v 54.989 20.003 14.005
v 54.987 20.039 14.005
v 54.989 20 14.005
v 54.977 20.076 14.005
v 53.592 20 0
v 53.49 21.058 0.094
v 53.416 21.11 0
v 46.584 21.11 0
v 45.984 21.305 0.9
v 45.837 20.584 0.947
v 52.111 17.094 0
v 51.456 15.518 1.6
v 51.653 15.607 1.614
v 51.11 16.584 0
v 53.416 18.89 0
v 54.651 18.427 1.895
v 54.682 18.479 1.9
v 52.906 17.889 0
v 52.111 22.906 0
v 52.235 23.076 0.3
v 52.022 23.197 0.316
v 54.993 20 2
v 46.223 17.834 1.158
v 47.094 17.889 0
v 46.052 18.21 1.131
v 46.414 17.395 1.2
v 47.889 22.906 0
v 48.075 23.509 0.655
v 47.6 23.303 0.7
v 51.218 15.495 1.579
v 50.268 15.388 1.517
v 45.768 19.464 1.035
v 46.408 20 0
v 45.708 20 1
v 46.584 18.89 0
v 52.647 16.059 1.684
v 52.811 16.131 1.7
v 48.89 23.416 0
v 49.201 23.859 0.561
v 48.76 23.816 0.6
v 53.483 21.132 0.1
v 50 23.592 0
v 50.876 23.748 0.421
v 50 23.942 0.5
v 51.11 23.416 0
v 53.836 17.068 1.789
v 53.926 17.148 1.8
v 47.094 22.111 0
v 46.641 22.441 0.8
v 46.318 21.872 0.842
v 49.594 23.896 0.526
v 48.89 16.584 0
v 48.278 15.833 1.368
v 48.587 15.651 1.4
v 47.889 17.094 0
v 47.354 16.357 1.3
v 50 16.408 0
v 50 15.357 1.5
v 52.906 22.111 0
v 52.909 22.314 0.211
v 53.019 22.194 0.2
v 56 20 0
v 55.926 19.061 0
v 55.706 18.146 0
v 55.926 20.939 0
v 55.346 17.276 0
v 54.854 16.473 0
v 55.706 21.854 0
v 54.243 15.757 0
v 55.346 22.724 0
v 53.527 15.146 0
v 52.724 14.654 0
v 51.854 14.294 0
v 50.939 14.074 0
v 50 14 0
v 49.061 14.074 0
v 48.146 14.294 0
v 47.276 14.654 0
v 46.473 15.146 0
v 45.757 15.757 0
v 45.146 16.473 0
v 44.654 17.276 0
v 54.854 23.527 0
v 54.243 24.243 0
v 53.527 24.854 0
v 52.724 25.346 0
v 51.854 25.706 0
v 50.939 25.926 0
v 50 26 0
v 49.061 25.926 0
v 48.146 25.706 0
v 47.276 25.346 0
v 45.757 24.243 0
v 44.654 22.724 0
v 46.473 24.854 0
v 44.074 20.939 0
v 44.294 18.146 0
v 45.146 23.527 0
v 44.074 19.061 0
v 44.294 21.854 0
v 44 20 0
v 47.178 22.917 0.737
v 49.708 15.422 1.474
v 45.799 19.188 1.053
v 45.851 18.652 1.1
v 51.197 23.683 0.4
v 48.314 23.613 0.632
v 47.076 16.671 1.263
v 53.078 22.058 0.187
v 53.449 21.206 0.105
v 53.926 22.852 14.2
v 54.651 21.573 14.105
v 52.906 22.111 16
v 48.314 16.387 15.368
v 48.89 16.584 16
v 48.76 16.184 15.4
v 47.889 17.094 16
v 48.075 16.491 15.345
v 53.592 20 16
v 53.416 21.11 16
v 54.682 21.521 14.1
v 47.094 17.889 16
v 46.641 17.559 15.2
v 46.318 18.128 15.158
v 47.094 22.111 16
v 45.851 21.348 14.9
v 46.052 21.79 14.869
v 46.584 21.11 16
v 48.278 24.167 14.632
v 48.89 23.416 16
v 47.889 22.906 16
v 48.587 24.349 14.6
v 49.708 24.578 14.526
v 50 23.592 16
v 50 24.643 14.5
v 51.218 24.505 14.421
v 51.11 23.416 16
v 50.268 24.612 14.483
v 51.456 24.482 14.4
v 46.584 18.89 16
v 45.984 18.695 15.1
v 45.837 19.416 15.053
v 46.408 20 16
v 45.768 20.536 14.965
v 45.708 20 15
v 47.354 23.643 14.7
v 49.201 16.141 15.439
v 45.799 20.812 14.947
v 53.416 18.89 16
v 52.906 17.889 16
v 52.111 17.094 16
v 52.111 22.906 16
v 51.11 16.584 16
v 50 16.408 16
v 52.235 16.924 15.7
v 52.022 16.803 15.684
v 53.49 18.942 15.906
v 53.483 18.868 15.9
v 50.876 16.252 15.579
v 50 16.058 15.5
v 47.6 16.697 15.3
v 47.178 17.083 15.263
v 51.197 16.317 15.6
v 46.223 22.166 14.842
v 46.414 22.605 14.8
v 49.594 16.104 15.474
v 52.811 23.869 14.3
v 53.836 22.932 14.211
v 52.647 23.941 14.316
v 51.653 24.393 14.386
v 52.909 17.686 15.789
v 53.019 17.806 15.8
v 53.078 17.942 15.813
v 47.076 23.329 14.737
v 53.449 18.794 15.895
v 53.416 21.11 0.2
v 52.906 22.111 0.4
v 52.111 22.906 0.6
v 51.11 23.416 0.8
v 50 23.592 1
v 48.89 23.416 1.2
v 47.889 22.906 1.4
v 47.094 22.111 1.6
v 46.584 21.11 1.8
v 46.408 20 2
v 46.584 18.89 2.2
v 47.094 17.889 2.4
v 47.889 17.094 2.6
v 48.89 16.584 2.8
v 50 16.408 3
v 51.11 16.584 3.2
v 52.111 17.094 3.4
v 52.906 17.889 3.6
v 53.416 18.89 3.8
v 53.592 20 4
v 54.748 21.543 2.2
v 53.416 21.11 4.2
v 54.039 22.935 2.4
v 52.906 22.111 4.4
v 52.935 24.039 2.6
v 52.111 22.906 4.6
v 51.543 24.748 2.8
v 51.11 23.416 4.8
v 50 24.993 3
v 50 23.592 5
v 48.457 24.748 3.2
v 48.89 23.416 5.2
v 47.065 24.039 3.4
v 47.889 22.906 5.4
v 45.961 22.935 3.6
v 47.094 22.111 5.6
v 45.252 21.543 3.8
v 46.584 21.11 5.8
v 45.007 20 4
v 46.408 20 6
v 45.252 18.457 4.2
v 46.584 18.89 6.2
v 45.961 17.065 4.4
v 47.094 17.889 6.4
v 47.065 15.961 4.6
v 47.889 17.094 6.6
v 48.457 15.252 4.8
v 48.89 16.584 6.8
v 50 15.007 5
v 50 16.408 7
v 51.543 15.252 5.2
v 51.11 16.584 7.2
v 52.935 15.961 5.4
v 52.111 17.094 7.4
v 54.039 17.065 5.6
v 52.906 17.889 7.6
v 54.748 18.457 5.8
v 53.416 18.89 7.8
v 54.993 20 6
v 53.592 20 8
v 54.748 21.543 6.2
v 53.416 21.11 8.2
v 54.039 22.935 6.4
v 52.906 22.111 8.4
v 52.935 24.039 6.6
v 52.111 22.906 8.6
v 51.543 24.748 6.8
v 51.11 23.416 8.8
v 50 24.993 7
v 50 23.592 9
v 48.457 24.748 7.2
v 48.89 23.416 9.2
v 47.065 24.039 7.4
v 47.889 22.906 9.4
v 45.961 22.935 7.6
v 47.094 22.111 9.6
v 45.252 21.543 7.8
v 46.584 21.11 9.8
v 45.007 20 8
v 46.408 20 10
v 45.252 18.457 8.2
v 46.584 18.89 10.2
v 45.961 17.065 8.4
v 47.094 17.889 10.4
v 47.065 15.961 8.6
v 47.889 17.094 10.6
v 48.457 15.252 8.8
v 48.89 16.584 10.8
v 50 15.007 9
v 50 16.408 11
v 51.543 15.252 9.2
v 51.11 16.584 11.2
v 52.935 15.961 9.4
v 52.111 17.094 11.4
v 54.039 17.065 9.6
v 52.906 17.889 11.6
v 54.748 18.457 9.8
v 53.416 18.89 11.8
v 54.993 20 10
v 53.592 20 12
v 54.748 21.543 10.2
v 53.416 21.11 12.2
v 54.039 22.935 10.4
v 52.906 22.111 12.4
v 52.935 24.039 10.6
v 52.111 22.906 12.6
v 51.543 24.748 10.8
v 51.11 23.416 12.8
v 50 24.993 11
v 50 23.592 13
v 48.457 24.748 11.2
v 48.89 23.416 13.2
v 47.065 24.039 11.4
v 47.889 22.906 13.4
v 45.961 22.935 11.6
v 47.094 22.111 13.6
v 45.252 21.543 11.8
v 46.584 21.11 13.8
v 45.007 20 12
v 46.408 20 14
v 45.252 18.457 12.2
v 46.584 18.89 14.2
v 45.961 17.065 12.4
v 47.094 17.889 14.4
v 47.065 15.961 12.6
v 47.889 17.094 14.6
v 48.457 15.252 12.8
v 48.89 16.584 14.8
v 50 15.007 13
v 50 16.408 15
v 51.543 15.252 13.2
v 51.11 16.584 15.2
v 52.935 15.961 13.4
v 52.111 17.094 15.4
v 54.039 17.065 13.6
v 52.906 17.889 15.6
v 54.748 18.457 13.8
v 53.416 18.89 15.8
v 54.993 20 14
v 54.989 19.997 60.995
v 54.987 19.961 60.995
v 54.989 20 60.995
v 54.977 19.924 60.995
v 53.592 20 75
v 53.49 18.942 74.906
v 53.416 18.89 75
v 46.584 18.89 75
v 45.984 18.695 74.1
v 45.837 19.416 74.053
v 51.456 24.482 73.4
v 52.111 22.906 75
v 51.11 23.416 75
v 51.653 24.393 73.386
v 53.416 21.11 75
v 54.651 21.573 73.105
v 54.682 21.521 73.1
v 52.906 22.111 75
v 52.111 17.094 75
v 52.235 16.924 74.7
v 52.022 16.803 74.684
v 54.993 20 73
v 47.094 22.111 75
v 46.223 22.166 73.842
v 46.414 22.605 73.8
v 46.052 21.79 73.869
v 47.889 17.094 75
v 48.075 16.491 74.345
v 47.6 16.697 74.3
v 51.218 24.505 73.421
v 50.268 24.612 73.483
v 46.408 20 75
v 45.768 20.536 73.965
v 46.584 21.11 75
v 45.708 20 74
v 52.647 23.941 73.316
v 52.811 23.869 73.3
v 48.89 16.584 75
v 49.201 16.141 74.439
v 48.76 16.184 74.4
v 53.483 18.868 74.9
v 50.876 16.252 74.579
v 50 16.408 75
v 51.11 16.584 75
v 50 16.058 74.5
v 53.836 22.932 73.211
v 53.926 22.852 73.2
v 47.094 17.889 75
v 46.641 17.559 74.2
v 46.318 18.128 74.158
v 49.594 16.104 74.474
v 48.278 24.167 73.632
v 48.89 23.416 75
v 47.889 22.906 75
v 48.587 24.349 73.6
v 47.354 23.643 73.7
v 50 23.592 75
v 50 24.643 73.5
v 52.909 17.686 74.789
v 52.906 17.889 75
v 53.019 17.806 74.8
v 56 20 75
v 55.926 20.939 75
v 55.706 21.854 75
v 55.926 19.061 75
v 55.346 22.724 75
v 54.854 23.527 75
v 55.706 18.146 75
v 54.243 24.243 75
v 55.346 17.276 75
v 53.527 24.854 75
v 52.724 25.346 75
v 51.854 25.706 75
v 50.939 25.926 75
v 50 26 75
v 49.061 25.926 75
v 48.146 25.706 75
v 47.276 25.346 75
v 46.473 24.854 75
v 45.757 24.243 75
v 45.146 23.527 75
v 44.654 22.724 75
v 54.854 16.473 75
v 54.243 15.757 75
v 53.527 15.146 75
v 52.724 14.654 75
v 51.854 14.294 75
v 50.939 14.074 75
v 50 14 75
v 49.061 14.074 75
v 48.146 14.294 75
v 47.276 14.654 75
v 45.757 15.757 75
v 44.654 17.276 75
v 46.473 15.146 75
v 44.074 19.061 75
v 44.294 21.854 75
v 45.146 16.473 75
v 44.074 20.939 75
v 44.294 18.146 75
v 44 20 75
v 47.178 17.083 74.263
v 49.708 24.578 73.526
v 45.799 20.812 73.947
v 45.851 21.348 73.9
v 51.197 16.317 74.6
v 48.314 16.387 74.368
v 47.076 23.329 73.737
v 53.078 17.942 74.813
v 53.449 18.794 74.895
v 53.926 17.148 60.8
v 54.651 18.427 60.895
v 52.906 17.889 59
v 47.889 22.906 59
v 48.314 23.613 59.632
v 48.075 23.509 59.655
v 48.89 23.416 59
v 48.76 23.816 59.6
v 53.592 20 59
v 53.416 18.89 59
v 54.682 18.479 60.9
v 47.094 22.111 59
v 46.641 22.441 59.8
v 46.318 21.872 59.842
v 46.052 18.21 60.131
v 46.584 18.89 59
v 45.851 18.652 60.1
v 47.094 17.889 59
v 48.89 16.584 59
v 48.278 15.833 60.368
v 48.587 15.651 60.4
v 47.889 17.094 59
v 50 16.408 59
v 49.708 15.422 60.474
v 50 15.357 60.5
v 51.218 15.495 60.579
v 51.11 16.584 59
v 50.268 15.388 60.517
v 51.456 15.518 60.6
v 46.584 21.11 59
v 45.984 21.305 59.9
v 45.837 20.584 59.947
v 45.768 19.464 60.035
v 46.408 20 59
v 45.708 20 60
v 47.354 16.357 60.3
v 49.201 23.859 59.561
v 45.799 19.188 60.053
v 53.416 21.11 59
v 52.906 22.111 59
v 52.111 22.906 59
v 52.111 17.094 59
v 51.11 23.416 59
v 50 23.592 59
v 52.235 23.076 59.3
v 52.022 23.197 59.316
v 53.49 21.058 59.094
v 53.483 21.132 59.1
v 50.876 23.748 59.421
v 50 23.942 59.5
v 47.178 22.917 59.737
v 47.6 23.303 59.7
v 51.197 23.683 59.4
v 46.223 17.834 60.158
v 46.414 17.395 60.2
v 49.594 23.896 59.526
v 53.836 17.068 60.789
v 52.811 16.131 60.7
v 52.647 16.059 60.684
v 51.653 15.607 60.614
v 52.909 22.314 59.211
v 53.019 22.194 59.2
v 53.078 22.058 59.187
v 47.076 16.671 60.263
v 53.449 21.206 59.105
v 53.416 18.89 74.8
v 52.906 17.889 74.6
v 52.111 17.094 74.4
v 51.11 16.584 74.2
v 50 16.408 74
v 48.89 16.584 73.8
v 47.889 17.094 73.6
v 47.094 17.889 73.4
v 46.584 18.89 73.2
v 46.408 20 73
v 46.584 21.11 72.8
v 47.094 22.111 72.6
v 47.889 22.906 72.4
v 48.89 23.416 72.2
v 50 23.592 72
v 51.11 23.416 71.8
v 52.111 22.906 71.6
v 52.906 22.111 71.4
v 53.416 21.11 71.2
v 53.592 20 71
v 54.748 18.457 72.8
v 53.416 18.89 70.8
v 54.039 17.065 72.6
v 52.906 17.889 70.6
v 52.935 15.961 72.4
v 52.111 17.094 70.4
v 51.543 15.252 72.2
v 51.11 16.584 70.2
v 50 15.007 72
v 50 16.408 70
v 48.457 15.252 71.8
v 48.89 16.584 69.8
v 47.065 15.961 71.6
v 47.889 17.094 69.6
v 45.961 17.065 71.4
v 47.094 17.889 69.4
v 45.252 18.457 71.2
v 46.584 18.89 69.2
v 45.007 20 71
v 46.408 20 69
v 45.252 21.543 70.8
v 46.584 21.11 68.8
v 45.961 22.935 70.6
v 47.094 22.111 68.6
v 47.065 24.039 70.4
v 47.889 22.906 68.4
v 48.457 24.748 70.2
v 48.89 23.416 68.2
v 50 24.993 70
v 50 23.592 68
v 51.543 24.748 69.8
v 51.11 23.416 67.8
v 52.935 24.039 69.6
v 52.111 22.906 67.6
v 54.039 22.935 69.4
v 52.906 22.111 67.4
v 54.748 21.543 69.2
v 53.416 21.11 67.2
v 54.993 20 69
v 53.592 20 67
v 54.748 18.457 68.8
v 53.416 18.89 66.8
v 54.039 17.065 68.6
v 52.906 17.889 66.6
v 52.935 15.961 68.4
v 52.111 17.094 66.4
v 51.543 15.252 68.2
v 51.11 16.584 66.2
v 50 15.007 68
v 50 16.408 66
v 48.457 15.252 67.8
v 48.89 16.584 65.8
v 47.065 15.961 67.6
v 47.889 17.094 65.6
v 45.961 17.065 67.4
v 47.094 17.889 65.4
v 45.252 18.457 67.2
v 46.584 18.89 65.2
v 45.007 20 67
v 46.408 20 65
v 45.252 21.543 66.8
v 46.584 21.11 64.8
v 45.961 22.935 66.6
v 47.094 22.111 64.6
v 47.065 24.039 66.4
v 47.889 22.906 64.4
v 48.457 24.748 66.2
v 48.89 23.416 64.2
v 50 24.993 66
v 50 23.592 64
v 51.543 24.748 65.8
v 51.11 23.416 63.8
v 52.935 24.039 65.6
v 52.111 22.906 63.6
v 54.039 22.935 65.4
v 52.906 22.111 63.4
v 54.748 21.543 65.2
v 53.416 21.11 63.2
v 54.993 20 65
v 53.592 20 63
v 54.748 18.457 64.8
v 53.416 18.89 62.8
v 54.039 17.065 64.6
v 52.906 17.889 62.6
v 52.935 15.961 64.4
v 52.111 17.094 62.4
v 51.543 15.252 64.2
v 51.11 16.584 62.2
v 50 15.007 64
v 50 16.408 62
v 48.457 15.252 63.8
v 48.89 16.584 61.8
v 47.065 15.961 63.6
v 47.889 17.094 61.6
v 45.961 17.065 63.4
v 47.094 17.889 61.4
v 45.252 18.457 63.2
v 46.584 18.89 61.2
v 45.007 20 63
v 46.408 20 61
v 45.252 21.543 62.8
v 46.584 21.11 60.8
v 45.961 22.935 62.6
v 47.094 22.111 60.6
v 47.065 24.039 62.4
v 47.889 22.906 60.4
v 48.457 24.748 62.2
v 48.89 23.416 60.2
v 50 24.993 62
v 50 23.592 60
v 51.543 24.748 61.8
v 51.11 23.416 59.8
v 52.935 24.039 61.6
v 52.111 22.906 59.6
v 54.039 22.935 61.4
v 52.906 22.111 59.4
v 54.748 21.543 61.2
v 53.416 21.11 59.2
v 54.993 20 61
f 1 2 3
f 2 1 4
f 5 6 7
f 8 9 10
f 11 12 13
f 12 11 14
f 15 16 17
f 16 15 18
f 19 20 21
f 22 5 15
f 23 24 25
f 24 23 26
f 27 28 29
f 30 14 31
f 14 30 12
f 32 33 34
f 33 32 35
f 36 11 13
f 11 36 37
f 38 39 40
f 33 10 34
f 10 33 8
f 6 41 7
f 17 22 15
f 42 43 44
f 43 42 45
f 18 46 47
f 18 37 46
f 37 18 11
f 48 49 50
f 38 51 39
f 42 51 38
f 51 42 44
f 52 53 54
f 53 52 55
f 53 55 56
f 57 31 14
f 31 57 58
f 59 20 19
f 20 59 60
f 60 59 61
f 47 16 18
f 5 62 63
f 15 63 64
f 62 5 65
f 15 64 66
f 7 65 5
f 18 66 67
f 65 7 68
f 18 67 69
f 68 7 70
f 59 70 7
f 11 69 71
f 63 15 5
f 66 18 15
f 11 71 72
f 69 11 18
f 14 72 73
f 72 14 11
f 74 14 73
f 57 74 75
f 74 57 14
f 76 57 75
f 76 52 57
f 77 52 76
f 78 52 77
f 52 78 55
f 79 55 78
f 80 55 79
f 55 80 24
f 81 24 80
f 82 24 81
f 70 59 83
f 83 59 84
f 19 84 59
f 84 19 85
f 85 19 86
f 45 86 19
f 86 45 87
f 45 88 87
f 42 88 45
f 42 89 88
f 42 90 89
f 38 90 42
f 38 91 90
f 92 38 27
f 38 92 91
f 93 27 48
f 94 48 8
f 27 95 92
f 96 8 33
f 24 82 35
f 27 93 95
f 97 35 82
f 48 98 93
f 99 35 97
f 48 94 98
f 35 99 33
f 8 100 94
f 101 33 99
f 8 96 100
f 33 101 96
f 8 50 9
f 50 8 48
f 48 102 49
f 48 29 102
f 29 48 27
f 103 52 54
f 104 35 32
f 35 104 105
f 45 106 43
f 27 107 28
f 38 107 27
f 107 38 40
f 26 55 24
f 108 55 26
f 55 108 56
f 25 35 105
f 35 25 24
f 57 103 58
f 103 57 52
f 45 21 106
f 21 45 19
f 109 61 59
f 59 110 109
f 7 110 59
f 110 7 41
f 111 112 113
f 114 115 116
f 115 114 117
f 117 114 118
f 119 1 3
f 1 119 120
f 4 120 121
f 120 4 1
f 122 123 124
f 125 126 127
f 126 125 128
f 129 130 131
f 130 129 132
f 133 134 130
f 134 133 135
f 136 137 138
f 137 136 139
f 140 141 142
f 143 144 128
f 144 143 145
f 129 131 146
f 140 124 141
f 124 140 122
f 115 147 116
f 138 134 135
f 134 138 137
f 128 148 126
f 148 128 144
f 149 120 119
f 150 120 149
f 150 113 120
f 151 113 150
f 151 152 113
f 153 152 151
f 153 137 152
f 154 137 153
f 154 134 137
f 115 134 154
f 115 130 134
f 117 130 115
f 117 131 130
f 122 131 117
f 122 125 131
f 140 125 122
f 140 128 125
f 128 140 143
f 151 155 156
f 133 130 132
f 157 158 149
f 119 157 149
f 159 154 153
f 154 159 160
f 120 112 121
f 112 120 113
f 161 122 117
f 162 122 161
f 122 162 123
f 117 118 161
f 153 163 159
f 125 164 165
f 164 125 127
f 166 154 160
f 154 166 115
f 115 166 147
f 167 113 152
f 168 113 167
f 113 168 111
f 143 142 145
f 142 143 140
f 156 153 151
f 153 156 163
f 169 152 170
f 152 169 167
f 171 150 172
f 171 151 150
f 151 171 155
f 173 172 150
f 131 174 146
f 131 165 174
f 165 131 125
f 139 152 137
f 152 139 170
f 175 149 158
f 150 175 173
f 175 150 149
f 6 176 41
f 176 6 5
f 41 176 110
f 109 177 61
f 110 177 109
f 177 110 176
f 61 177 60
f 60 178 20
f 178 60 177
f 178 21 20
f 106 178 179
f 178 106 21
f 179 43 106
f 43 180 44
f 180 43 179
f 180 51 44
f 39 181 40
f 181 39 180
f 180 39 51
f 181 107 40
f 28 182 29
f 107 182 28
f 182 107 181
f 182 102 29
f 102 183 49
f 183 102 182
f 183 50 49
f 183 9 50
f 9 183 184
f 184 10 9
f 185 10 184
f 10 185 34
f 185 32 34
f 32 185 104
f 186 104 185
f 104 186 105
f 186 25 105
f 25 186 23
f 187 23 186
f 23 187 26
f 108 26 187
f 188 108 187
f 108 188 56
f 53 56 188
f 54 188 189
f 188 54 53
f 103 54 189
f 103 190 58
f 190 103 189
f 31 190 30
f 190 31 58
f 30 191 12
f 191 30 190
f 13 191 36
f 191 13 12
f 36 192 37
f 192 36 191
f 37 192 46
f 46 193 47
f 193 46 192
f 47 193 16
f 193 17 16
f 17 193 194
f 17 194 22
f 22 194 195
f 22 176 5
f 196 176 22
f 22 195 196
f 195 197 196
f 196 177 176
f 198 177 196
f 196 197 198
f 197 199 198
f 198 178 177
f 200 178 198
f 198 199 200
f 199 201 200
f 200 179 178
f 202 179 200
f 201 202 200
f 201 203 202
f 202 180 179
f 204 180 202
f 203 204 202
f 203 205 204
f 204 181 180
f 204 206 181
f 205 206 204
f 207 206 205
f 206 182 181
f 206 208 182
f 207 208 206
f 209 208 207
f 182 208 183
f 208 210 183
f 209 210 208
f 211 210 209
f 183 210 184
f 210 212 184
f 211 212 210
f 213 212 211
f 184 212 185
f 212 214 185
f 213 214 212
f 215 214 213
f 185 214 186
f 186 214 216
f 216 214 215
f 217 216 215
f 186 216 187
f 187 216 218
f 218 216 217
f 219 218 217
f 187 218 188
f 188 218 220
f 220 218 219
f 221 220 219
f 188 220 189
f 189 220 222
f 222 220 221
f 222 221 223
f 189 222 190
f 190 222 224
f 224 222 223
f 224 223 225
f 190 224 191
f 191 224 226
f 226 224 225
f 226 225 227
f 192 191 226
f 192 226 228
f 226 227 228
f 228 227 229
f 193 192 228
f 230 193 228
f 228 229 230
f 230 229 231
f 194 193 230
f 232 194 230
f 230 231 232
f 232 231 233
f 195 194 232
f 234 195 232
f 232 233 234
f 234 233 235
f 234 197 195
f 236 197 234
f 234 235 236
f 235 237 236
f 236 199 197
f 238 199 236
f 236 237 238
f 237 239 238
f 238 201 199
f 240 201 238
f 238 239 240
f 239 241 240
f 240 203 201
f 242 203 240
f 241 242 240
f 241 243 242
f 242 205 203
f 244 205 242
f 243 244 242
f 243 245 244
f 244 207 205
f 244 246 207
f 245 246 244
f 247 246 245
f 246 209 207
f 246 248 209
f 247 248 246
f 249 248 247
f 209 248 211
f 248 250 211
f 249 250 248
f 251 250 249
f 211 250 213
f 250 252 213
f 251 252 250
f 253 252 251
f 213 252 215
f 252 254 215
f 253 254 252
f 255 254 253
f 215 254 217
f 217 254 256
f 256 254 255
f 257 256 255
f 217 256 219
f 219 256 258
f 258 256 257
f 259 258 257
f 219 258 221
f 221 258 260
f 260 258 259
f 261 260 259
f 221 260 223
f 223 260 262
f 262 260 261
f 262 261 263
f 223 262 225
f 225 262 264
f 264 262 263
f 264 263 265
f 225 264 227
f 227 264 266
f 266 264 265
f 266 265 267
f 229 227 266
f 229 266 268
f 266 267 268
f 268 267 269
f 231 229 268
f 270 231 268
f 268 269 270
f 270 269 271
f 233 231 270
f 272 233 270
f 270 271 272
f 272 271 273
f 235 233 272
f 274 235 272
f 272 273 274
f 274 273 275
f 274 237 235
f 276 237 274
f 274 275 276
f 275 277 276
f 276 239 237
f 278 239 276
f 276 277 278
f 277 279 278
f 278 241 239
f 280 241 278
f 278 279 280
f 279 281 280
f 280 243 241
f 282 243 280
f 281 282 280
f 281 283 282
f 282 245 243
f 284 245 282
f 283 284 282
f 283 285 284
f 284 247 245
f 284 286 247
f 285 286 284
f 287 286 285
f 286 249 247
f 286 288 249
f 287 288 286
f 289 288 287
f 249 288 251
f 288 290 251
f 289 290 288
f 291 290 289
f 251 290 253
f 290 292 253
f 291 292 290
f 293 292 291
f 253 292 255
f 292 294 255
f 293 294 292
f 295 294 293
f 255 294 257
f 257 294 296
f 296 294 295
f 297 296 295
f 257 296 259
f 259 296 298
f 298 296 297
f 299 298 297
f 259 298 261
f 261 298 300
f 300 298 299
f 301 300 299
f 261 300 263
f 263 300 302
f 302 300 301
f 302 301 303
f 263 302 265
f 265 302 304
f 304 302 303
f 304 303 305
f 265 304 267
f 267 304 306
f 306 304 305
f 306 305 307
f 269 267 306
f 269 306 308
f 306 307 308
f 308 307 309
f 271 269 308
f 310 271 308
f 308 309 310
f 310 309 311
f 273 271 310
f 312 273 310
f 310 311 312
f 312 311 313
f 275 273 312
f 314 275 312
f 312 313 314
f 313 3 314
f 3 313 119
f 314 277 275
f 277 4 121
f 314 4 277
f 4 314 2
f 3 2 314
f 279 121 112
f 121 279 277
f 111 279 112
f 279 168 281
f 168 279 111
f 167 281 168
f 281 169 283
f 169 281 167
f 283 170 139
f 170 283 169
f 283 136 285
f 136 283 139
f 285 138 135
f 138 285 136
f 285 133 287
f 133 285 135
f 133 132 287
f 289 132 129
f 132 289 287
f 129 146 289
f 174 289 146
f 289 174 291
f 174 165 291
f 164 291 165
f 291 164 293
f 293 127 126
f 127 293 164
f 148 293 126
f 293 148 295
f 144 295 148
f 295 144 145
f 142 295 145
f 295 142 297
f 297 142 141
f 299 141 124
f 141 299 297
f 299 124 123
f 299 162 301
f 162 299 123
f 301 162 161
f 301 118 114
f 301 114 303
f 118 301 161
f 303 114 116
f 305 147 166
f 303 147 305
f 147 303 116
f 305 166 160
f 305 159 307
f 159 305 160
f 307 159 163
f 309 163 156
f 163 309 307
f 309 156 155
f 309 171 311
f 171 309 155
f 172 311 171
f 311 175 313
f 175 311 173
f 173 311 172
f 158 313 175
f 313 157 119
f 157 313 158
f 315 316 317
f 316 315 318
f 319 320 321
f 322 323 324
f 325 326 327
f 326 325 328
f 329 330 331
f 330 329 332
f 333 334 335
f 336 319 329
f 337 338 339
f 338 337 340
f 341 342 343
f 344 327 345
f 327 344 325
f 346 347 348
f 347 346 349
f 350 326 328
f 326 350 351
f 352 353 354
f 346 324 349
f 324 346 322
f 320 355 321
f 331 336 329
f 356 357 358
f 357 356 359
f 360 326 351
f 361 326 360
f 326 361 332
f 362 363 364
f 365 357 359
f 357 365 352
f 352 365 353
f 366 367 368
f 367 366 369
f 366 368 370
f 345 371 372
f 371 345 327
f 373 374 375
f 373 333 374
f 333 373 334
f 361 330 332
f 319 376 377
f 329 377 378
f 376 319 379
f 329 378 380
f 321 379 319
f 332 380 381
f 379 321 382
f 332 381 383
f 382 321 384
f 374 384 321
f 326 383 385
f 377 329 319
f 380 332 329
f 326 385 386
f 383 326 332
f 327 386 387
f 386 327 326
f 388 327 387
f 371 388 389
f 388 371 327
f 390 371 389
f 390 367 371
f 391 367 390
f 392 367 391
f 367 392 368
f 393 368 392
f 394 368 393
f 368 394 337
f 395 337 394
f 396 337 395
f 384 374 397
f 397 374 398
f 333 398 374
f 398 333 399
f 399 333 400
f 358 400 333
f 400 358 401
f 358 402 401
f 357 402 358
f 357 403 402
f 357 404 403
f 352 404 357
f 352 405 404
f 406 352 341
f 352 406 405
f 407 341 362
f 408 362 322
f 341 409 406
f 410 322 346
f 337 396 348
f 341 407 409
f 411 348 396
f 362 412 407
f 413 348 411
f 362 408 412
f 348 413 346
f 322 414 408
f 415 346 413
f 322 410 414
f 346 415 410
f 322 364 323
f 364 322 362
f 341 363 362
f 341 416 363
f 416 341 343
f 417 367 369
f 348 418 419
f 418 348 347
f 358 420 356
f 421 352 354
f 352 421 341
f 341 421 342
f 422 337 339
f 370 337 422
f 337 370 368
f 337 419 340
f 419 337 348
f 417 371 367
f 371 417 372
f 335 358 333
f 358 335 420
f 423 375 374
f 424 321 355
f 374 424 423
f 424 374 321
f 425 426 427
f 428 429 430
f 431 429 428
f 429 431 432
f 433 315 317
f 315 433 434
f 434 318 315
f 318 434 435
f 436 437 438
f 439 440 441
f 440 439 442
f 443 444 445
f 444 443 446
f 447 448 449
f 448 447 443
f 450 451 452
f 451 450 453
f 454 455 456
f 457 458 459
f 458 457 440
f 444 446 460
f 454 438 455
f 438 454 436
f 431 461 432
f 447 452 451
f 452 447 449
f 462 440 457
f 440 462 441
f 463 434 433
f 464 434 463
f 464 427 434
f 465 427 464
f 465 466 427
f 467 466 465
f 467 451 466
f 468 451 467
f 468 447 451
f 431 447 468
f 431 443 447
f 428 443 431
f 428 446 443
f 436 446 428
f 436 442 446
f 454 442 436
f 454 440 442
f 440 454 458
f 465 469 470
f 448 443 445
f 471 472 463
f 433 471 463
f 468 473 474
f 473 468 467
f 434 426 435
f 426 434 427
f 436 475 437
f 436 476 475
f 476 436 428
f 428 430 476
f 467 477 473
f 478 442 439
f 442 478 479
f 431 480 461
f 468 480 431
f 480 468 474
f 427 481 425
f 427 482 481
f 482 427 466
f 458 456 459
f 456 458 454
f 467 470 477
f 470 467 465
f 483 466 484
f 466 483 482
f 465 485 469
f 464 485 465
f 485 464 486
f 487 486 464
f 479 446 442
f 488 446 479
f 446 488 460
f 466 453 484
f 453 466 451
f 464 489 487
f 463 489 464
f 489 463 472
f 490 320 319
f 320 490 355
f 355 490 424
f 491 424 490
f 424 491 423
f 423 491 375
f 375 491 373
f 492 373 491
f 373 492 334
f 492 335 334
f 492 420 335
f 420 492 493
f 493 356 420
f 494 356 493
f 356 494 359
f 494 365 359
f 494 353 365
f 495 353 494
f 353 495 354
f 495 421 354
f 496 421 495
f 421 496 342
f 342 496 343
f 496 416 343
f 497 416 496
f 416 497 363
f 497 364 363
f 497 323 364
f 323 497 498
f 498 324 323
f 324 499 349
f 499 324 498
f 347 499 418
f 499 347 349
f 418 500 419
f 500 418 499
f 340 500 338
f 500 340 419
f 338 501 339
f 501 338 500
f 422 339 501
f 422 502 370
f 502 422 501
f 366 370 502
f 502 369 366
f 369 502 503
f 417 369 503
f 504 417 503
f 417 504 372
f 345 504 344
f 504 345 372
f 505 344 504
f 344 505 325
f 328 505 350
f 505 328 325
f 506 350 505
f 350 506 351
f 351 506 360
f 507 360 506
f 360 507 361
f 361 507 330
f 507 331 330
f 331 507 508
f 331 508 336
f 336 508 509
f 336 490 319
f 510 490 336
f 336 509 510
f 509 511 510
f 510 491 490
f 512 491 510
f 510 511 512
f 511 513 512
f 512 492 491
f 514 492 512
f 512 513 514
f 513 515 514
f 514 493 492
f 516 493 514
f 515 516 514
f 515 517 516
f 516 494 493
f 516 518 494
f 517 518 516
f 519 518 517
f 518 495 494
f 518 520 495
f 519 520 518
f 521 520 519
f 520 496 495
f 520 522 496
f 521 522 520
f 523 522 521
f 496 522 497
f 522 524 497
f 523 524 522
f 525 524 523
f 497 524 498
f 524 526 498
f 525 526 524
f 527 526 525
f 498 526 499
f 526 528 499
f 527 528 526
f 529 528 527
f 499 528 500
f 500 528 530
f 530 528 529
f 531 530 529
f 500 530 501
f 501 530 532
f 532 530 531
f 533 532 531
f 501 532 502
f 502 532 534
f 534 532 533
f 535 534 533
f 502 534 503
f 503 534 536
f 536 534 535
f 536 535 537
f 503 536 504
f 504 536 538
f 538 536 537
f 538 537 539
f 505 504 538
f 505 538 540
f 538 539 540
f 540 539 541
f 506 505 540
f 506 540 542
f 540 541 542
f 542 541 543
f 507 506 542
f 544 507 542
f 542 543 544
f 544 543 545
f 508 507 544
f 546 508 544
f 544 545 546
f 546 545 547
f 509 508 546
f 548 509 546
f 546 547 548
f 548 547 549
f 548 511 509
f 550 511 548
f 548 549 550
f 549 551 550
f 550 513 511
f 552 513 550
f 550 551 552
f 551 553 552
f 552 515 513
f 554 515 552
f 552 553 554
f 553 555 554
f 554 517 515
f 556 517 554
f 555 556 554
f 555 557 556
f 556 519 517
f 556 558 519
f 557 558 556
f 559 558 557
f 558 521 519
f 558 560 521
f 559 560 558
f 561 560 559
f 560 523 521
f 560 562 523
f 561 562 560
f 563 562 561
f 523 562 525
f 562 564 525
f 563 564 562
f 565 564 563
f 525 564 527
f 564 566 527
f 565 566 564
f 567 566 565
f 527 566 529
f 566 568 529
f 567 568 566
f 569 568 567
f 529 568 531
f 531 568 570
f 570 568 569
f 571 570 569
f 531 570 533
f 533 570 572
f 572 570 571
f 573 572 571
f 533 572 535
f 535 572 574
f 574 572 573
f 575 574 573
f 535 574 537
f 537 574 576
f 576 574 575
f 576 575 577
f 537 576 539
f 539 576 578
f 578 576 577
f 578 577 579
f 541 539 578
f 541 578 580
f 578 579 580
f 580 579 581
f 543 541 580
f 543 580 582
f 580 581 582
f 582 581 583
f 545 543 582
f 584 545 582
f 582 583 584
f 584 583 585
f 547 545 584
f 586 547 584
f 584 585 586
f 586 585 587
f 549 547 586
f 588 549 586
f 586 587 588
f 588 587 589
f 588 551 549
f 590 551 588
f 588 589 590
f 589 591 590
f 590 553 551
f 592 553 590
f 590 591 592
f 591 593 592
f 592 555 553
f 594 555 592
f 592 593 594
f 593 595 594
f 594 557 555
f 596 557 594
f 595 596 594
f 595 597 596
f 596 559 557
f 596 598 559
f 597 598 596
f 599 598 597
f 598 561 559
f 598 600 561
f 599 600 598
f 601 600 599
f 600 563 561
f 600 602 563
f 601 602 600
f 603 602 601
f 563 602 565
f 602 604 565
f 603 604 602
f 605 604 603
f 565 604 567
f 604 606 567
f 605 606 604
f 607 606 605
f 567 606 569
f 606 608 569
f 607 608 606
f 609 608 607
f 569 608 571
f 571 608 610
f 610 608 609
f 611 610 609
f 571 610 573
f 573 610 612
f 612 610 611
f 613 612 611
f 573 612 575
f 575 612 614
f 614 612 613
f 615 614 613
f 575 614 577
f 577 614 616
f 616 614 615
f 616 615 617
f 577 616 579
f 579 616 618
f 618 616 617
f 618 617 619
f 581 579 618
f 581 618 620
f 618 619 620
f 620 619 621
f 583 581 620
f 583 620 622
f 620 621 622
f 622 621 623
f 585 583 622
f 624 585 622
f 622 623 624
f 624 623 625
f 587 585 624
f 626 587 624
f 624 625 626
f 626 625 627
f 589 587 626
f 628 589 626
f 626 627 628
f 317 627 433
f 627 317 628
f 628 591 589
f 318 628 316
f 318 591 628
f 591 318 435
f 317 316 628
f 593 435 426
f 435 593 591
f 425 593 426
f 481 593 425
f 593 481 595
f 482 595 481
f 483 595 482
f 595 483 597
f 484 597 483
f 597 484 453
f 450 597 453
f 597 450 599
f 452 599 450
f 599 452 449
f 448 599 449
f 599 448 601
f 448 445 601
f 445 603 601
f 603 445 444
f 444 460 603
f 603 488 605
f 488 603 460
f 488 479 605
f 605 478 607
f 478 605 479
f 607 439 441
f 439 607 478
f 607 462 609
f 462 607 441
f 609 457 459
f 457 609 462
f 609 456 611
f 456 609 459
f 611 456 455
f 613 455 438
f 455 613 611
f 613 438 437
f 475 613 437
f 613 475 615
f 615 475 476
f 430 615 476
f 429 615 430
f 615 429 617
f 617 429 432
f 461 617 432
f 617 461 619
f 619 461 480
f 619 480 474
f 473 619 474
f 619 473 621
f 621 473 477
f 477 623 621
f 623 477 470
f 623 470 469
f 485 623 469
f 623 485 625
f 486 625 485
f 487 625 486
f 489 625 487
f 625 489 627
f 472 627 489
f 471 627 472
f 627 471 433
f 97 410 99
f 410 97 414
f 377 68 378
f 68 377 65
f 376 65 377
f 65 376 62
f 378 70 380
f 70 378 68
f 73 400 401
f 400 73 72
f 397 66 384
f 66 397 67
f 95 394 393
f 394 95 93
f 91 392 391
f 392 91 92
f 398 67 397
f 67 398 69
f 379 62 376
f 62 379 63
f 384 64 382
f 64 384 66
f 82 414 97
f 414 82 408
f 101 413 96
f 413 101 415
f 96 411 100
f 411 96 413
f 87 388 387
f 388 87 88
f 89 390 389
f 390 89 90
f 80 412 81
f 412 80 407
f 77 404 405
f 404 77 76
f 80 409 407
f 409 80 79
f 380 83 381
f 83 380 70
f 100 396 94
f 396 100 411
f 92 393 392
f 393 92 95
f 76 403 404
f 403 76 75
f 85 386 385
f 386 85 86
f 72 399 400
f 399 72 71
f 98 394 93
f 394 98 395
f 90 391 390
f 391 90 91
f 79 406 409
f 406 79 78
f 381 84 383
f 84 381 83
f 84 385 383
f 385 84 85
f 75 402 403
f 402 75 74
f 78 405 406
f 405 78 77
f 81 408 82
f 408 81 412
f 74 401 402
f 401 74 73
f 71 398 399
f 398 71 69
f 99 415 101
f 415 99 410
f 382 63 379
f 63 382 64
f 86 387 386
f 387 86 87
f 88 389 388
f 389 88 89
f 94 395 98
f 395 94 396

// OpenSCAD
// file: polyScrewThread_r1.scad
/*
 *    polyScrewThread_r1.scad    by aubenc @ Thingiverse
 *
 * This script contains the library modules that can be used to generate
 * threaded rods, screws and nuts.
 *
 * http://www.thingiverse.com/thing:8796
 *
 * CC Public Domain
 */

module screw_thread(od,st,lf0,lt,rs,cs)
{
    or=od/2;
    ir=or-st/2*cos(lf0)/sin(lf0);
    pf=2*PI*or;
    sn=floor(pf/rs);
    lfxy=360/sn;
    ttn=round(lt/st+1);
    zt=st/sn;

    intersection()
    {
        if (cs >= -1)
        {
           thread_shape(cs,lt,or,ir,sn,st);
        }

        full_thread(ttn,st,sn,zt,lfxy,or,ir);
    }
}

module hex_nut(df,hg,sth,clf,cod,crs)
{

    difference()
    {
        hex_head(hg,df);

        hex_countersink_ends(sth/2,cod,clf,crs,hg);

        screw_thread(cod,sth,clf,hg,crs,-2);
    }
}


module hex_screw(od,st,lf0,lt,rs,cs,df,hg,ntl,ntd)
{
    ntr=od/2-(st/2)*cos(lf0)/sin(lf0);

    union()
    {
        hex_head(hg,df);

        translate([0,0,hg])
        if ( ntl == 0 )
        {
            cylinder(h=0.01, r=ntr, center=true);
        }
        else
        {
            if ( ntd == -1 )
            {
                cylinder(h=ntl+0.01, r=ntr, $fn=floor(od*PI/rs), center=false);
            }
            else if ( ntd == 0 )
            {
                union()
                {
                    cylinder(h=ntl-st/2,
                             r=od/2, $fn=floor(od*PI/rs), center=false);

                    translate([0,0,ntl-st/2])
                    cylinder(h=st/2,
                             r1=od/2, r2=ntr, 
                             $fn=floor(od*PI/rs), center=false);
                }
            }
            else
            {
                cylinder(h=ntl, r=ntd/2, $fn=ntd*PI/rs, center=false);
            }
        }

        translate([0,0,ntl+hg]) screw_thread(od,st,lf0,lt,rs,cs);
    }
}

module hex_screw_0(od,st,lf0,lt,rs,cs,df,hg,ntl,ntd)
{
    ntr=od/2-(st/2)*cos(lf0)/sin(lf0);

    union()
    {
        hex_head_0(hg,df);

        translate([0,0,hg])
        if ( ntl == 0 )
        {
            cylinder(h=0.01, r=ntr, center=true);
        }
        else
        {
            if ( ntd == -1 )
            {
                cylinder(h=ntl+0.01, r=ntr, $fn=floor(od*PI/rs), center=false);
            }
            else if ( ntd == 0 )
            {
                union()
                {
                    cylinder(h=ntl-st/2,
                             r=od/2, $fn=floor(od*PI/rs), center=false);

                    translate([0,0,ntl-st/2])
                    cylinder(h=st/2,
                             r1=od/2, r2=ntr, 
                             $fn=floor(od*PI/rs), center=false);
                }
            }
            else
            {
                cylinder(h=ntl, r=ntd/2, $fn=ntd*PI/rs, center=false);
            }
        }

        translate([0,0,ntl+hg]) screw_thread(od,st,lf0,lt,rs,cs);
    }
}

module thread_shape(cs,lt,or,ir,sn,st)
{
    if ( cs == 0 )
    {
        cylinder(h=lt, r=or, $fn=sn, center=false);
    }
    else
    {
        union()
        {
            translate([0,0,st/2])
              cylinder(h=lt-st+0.005, r=or, $fn=sn, center=false);

            if ( cs == -1 || cs == 2 )
            {
                cylinder(h=st/2, r1=ir, r2=or, $fn=sn, center=false);
            }
            else
            {
                cylinder(h=st/2, r=or, $fn=sn, center=false);
            }

            translate([0,0,lt-st/2])
            if ( cs == 1 || cs == 2 )
            {
                  cylinder(h=st/2, r1=or, r2=ir, $fn=sn, center=false);
            }
            else
            {
                cylinder(h=st/2, r=or, $fn=sn, center=false);
            }
        }
    }
}

module full_thread(ttn,st,sn,zt,lfxy,or,ir)
{
  if(ir >= 0.2)
  {
    for(i=[0:ttn-1])
    {
        for(j=[0:sn-1])
			assign( pt = [	[0,                  0,                  i*st-st            ],
                        [ir*cos(j*lfxy),     ir*sin(j*lfxy),     i*st+j*zt-st       ],
                        [ir*cos((j+1)*lfxy), ir*sin((j+1)*lfxy), i*st+(j+1)*zt-st   ],
								[0,0,i*st],
                        [or*cos(j*lfxy),     or*sin(j*lfxy),     i*st+j*zt-st/2     ],
                        [or*cos((j+1)*lfxy), or*sin((j+1)*lfxy), i*st+(j+1)*zt-st/2 ],
                        [ir*cos(j*lfxy),     ir*sin(j*lfxy),     i*st+j*zt          ],
                        [ir*cos((j+1)*lfxy), ir*sin((j+1)*lfxy), i*st+(j+1)*zt      ],
                        [0,                  0,                  i*st+st            ]	])
        {
            polyhedron(points=pt,
              		  triangles=[	[1,0,3],[1,3,6],[6,3,8],[1,6,4],
											[0,1,2],[1,4,2],[2,4,5],[5,4,6],[5,6,7],[7,6,8],
											[7,8,3],[0,2,3],[3,2,7],[7,2,5]	]);
        }
    }
  }
  else
  {
    echo("Step Degrees too agresive, the thread will not be made!!");
    echo("Try to increase de value for the degrees and/or...");
    echo(" decrease the pitch value and/or...");
    echo(" increase the outer diameter value.");
  }
}

module hex_head(hg,df)
{
	rd0=df/2/sin(60);
	x0=0;	x1=df/2;	x2=x1+hg/2;
	y0=0;	y1=hg/2;	y2=hg;

	intersection()
	{
	   cylinder(h=hg, r=rd0, $fn=6, center=false);

		rotate_extrude(convexity=10, $fn=6*round(df*PI/6/0.5))
		polygon([ [x0,y0],[x1,y0],[x2,y1],[x1,y2],[x0,y2] ]);
	}
}

module hex_head_0(hg,df)
{
    cylinder(h=hg, r=df/2/sin(60), $fn=6, center=false);
}

module hex_countersink_ends(chg,cod,clf,crs,hg)
{
    translate([0,0,-0.1])
    cylinder(h=chg+0.01, 
             r1=cod/2, 
             r2=cod/2-(chg+0.1)*cos(clf)/sin(clf),
             $fn=floor(cod*PI/crs), center=false);

    translate([0,0,hg-chg+0.1])
    cylinder(h=chg+0.01, 
             r1=cod/2-(chg+0.1)*cos(clf)/sin(clf),
             r2=cod/2, 
             $fn=floor(cod*PI/crs), center=false);
}
// main file
$fn = 40;

include <polyScrewThread_r1.scad>

//base radius
br = 35;

//base height
bh = 8;

//holder width
hw = 80;

//holder height
hh = 44;

//holder thickness
hth = 3;

//minkowski radius
mr = 3;

//axle width 1
aw1 = 28+mr*2;

//axle width 2
aw2 = 12+mr*2;

give = 1.5;


module screw()
{
hex_screw(12/sqrt(2),4,55,16,1.5,2,15,0,4,0);
}

module screw_hole()
{
//hex_screw(12/sqrt(2)+give,4,55,16,1.5,2,15,0,4,0);
screw_thread(12/sqrt(2)+give,4,55,16,1.5,2);
}


module base()
{
translate([0,0,bh-2])
screw();

cylinder(r=br, h=bh-2);
translate([0,0,bh-2])
cylinder(r1=br, r2=br-2, h=2);

}

module holder()
{
translate([aw1+(hw-aw1-aw2)/2, -hh/2, 0])
screw();

minkowski()
{
cylinder(r=3,h=.01);
difference()
{
linear_extrude(height=hth)
polygon(points=[[0,0],[hw/3,0],[2*hw/3,-(hh-aw1)/2],[hw,-(hh-aw1)/2], [hw,-(hh-aw1)/2-(aw1-aw2)-aw2], [2*hw/3,-(hh-aw1)/2-(aw1-aw2)-aw2], [aw1,-hh], [0,-hh]]);

translate([0,-(hh-aw1)/2-aw1,0])
{
translate([-aw1/2,0,0])
cube([aw1,aw1,4]);
translate([aw1/2,aw1/2,0])
cylinder(r=aw1/2, h=4);
}

translate([hw,-hh/2-aw2+aw2/2,0])
{
translate([-aw2/2,0,0])
cube([aw2+1,aw2,5]);
translate([-aw2/2+1,aw2/2,0])
cylinder(r=aw2/2, h=10);
}
}

//translate([-hw/2, -hh/2,0])

/*
minkowski()
{
cylinder(r=3,h=.01);
difference()
{

cube([hw,hh,hth]);



translate([hw-aw1*1.5,hh/2-aw1/2,0])
cube([aw1*1.5,aw1,hth+1]);
}
}
*/
}
}


module pole()
{




difference()
{
cylinder(r=6, h=75);

screw_hole();

translate([0,0,75])
rotate([180,0,0])
screw_hole();
}

}

translate([50,20,0])
pole();
//holder();


//translate([-40,0,0])
//base();
